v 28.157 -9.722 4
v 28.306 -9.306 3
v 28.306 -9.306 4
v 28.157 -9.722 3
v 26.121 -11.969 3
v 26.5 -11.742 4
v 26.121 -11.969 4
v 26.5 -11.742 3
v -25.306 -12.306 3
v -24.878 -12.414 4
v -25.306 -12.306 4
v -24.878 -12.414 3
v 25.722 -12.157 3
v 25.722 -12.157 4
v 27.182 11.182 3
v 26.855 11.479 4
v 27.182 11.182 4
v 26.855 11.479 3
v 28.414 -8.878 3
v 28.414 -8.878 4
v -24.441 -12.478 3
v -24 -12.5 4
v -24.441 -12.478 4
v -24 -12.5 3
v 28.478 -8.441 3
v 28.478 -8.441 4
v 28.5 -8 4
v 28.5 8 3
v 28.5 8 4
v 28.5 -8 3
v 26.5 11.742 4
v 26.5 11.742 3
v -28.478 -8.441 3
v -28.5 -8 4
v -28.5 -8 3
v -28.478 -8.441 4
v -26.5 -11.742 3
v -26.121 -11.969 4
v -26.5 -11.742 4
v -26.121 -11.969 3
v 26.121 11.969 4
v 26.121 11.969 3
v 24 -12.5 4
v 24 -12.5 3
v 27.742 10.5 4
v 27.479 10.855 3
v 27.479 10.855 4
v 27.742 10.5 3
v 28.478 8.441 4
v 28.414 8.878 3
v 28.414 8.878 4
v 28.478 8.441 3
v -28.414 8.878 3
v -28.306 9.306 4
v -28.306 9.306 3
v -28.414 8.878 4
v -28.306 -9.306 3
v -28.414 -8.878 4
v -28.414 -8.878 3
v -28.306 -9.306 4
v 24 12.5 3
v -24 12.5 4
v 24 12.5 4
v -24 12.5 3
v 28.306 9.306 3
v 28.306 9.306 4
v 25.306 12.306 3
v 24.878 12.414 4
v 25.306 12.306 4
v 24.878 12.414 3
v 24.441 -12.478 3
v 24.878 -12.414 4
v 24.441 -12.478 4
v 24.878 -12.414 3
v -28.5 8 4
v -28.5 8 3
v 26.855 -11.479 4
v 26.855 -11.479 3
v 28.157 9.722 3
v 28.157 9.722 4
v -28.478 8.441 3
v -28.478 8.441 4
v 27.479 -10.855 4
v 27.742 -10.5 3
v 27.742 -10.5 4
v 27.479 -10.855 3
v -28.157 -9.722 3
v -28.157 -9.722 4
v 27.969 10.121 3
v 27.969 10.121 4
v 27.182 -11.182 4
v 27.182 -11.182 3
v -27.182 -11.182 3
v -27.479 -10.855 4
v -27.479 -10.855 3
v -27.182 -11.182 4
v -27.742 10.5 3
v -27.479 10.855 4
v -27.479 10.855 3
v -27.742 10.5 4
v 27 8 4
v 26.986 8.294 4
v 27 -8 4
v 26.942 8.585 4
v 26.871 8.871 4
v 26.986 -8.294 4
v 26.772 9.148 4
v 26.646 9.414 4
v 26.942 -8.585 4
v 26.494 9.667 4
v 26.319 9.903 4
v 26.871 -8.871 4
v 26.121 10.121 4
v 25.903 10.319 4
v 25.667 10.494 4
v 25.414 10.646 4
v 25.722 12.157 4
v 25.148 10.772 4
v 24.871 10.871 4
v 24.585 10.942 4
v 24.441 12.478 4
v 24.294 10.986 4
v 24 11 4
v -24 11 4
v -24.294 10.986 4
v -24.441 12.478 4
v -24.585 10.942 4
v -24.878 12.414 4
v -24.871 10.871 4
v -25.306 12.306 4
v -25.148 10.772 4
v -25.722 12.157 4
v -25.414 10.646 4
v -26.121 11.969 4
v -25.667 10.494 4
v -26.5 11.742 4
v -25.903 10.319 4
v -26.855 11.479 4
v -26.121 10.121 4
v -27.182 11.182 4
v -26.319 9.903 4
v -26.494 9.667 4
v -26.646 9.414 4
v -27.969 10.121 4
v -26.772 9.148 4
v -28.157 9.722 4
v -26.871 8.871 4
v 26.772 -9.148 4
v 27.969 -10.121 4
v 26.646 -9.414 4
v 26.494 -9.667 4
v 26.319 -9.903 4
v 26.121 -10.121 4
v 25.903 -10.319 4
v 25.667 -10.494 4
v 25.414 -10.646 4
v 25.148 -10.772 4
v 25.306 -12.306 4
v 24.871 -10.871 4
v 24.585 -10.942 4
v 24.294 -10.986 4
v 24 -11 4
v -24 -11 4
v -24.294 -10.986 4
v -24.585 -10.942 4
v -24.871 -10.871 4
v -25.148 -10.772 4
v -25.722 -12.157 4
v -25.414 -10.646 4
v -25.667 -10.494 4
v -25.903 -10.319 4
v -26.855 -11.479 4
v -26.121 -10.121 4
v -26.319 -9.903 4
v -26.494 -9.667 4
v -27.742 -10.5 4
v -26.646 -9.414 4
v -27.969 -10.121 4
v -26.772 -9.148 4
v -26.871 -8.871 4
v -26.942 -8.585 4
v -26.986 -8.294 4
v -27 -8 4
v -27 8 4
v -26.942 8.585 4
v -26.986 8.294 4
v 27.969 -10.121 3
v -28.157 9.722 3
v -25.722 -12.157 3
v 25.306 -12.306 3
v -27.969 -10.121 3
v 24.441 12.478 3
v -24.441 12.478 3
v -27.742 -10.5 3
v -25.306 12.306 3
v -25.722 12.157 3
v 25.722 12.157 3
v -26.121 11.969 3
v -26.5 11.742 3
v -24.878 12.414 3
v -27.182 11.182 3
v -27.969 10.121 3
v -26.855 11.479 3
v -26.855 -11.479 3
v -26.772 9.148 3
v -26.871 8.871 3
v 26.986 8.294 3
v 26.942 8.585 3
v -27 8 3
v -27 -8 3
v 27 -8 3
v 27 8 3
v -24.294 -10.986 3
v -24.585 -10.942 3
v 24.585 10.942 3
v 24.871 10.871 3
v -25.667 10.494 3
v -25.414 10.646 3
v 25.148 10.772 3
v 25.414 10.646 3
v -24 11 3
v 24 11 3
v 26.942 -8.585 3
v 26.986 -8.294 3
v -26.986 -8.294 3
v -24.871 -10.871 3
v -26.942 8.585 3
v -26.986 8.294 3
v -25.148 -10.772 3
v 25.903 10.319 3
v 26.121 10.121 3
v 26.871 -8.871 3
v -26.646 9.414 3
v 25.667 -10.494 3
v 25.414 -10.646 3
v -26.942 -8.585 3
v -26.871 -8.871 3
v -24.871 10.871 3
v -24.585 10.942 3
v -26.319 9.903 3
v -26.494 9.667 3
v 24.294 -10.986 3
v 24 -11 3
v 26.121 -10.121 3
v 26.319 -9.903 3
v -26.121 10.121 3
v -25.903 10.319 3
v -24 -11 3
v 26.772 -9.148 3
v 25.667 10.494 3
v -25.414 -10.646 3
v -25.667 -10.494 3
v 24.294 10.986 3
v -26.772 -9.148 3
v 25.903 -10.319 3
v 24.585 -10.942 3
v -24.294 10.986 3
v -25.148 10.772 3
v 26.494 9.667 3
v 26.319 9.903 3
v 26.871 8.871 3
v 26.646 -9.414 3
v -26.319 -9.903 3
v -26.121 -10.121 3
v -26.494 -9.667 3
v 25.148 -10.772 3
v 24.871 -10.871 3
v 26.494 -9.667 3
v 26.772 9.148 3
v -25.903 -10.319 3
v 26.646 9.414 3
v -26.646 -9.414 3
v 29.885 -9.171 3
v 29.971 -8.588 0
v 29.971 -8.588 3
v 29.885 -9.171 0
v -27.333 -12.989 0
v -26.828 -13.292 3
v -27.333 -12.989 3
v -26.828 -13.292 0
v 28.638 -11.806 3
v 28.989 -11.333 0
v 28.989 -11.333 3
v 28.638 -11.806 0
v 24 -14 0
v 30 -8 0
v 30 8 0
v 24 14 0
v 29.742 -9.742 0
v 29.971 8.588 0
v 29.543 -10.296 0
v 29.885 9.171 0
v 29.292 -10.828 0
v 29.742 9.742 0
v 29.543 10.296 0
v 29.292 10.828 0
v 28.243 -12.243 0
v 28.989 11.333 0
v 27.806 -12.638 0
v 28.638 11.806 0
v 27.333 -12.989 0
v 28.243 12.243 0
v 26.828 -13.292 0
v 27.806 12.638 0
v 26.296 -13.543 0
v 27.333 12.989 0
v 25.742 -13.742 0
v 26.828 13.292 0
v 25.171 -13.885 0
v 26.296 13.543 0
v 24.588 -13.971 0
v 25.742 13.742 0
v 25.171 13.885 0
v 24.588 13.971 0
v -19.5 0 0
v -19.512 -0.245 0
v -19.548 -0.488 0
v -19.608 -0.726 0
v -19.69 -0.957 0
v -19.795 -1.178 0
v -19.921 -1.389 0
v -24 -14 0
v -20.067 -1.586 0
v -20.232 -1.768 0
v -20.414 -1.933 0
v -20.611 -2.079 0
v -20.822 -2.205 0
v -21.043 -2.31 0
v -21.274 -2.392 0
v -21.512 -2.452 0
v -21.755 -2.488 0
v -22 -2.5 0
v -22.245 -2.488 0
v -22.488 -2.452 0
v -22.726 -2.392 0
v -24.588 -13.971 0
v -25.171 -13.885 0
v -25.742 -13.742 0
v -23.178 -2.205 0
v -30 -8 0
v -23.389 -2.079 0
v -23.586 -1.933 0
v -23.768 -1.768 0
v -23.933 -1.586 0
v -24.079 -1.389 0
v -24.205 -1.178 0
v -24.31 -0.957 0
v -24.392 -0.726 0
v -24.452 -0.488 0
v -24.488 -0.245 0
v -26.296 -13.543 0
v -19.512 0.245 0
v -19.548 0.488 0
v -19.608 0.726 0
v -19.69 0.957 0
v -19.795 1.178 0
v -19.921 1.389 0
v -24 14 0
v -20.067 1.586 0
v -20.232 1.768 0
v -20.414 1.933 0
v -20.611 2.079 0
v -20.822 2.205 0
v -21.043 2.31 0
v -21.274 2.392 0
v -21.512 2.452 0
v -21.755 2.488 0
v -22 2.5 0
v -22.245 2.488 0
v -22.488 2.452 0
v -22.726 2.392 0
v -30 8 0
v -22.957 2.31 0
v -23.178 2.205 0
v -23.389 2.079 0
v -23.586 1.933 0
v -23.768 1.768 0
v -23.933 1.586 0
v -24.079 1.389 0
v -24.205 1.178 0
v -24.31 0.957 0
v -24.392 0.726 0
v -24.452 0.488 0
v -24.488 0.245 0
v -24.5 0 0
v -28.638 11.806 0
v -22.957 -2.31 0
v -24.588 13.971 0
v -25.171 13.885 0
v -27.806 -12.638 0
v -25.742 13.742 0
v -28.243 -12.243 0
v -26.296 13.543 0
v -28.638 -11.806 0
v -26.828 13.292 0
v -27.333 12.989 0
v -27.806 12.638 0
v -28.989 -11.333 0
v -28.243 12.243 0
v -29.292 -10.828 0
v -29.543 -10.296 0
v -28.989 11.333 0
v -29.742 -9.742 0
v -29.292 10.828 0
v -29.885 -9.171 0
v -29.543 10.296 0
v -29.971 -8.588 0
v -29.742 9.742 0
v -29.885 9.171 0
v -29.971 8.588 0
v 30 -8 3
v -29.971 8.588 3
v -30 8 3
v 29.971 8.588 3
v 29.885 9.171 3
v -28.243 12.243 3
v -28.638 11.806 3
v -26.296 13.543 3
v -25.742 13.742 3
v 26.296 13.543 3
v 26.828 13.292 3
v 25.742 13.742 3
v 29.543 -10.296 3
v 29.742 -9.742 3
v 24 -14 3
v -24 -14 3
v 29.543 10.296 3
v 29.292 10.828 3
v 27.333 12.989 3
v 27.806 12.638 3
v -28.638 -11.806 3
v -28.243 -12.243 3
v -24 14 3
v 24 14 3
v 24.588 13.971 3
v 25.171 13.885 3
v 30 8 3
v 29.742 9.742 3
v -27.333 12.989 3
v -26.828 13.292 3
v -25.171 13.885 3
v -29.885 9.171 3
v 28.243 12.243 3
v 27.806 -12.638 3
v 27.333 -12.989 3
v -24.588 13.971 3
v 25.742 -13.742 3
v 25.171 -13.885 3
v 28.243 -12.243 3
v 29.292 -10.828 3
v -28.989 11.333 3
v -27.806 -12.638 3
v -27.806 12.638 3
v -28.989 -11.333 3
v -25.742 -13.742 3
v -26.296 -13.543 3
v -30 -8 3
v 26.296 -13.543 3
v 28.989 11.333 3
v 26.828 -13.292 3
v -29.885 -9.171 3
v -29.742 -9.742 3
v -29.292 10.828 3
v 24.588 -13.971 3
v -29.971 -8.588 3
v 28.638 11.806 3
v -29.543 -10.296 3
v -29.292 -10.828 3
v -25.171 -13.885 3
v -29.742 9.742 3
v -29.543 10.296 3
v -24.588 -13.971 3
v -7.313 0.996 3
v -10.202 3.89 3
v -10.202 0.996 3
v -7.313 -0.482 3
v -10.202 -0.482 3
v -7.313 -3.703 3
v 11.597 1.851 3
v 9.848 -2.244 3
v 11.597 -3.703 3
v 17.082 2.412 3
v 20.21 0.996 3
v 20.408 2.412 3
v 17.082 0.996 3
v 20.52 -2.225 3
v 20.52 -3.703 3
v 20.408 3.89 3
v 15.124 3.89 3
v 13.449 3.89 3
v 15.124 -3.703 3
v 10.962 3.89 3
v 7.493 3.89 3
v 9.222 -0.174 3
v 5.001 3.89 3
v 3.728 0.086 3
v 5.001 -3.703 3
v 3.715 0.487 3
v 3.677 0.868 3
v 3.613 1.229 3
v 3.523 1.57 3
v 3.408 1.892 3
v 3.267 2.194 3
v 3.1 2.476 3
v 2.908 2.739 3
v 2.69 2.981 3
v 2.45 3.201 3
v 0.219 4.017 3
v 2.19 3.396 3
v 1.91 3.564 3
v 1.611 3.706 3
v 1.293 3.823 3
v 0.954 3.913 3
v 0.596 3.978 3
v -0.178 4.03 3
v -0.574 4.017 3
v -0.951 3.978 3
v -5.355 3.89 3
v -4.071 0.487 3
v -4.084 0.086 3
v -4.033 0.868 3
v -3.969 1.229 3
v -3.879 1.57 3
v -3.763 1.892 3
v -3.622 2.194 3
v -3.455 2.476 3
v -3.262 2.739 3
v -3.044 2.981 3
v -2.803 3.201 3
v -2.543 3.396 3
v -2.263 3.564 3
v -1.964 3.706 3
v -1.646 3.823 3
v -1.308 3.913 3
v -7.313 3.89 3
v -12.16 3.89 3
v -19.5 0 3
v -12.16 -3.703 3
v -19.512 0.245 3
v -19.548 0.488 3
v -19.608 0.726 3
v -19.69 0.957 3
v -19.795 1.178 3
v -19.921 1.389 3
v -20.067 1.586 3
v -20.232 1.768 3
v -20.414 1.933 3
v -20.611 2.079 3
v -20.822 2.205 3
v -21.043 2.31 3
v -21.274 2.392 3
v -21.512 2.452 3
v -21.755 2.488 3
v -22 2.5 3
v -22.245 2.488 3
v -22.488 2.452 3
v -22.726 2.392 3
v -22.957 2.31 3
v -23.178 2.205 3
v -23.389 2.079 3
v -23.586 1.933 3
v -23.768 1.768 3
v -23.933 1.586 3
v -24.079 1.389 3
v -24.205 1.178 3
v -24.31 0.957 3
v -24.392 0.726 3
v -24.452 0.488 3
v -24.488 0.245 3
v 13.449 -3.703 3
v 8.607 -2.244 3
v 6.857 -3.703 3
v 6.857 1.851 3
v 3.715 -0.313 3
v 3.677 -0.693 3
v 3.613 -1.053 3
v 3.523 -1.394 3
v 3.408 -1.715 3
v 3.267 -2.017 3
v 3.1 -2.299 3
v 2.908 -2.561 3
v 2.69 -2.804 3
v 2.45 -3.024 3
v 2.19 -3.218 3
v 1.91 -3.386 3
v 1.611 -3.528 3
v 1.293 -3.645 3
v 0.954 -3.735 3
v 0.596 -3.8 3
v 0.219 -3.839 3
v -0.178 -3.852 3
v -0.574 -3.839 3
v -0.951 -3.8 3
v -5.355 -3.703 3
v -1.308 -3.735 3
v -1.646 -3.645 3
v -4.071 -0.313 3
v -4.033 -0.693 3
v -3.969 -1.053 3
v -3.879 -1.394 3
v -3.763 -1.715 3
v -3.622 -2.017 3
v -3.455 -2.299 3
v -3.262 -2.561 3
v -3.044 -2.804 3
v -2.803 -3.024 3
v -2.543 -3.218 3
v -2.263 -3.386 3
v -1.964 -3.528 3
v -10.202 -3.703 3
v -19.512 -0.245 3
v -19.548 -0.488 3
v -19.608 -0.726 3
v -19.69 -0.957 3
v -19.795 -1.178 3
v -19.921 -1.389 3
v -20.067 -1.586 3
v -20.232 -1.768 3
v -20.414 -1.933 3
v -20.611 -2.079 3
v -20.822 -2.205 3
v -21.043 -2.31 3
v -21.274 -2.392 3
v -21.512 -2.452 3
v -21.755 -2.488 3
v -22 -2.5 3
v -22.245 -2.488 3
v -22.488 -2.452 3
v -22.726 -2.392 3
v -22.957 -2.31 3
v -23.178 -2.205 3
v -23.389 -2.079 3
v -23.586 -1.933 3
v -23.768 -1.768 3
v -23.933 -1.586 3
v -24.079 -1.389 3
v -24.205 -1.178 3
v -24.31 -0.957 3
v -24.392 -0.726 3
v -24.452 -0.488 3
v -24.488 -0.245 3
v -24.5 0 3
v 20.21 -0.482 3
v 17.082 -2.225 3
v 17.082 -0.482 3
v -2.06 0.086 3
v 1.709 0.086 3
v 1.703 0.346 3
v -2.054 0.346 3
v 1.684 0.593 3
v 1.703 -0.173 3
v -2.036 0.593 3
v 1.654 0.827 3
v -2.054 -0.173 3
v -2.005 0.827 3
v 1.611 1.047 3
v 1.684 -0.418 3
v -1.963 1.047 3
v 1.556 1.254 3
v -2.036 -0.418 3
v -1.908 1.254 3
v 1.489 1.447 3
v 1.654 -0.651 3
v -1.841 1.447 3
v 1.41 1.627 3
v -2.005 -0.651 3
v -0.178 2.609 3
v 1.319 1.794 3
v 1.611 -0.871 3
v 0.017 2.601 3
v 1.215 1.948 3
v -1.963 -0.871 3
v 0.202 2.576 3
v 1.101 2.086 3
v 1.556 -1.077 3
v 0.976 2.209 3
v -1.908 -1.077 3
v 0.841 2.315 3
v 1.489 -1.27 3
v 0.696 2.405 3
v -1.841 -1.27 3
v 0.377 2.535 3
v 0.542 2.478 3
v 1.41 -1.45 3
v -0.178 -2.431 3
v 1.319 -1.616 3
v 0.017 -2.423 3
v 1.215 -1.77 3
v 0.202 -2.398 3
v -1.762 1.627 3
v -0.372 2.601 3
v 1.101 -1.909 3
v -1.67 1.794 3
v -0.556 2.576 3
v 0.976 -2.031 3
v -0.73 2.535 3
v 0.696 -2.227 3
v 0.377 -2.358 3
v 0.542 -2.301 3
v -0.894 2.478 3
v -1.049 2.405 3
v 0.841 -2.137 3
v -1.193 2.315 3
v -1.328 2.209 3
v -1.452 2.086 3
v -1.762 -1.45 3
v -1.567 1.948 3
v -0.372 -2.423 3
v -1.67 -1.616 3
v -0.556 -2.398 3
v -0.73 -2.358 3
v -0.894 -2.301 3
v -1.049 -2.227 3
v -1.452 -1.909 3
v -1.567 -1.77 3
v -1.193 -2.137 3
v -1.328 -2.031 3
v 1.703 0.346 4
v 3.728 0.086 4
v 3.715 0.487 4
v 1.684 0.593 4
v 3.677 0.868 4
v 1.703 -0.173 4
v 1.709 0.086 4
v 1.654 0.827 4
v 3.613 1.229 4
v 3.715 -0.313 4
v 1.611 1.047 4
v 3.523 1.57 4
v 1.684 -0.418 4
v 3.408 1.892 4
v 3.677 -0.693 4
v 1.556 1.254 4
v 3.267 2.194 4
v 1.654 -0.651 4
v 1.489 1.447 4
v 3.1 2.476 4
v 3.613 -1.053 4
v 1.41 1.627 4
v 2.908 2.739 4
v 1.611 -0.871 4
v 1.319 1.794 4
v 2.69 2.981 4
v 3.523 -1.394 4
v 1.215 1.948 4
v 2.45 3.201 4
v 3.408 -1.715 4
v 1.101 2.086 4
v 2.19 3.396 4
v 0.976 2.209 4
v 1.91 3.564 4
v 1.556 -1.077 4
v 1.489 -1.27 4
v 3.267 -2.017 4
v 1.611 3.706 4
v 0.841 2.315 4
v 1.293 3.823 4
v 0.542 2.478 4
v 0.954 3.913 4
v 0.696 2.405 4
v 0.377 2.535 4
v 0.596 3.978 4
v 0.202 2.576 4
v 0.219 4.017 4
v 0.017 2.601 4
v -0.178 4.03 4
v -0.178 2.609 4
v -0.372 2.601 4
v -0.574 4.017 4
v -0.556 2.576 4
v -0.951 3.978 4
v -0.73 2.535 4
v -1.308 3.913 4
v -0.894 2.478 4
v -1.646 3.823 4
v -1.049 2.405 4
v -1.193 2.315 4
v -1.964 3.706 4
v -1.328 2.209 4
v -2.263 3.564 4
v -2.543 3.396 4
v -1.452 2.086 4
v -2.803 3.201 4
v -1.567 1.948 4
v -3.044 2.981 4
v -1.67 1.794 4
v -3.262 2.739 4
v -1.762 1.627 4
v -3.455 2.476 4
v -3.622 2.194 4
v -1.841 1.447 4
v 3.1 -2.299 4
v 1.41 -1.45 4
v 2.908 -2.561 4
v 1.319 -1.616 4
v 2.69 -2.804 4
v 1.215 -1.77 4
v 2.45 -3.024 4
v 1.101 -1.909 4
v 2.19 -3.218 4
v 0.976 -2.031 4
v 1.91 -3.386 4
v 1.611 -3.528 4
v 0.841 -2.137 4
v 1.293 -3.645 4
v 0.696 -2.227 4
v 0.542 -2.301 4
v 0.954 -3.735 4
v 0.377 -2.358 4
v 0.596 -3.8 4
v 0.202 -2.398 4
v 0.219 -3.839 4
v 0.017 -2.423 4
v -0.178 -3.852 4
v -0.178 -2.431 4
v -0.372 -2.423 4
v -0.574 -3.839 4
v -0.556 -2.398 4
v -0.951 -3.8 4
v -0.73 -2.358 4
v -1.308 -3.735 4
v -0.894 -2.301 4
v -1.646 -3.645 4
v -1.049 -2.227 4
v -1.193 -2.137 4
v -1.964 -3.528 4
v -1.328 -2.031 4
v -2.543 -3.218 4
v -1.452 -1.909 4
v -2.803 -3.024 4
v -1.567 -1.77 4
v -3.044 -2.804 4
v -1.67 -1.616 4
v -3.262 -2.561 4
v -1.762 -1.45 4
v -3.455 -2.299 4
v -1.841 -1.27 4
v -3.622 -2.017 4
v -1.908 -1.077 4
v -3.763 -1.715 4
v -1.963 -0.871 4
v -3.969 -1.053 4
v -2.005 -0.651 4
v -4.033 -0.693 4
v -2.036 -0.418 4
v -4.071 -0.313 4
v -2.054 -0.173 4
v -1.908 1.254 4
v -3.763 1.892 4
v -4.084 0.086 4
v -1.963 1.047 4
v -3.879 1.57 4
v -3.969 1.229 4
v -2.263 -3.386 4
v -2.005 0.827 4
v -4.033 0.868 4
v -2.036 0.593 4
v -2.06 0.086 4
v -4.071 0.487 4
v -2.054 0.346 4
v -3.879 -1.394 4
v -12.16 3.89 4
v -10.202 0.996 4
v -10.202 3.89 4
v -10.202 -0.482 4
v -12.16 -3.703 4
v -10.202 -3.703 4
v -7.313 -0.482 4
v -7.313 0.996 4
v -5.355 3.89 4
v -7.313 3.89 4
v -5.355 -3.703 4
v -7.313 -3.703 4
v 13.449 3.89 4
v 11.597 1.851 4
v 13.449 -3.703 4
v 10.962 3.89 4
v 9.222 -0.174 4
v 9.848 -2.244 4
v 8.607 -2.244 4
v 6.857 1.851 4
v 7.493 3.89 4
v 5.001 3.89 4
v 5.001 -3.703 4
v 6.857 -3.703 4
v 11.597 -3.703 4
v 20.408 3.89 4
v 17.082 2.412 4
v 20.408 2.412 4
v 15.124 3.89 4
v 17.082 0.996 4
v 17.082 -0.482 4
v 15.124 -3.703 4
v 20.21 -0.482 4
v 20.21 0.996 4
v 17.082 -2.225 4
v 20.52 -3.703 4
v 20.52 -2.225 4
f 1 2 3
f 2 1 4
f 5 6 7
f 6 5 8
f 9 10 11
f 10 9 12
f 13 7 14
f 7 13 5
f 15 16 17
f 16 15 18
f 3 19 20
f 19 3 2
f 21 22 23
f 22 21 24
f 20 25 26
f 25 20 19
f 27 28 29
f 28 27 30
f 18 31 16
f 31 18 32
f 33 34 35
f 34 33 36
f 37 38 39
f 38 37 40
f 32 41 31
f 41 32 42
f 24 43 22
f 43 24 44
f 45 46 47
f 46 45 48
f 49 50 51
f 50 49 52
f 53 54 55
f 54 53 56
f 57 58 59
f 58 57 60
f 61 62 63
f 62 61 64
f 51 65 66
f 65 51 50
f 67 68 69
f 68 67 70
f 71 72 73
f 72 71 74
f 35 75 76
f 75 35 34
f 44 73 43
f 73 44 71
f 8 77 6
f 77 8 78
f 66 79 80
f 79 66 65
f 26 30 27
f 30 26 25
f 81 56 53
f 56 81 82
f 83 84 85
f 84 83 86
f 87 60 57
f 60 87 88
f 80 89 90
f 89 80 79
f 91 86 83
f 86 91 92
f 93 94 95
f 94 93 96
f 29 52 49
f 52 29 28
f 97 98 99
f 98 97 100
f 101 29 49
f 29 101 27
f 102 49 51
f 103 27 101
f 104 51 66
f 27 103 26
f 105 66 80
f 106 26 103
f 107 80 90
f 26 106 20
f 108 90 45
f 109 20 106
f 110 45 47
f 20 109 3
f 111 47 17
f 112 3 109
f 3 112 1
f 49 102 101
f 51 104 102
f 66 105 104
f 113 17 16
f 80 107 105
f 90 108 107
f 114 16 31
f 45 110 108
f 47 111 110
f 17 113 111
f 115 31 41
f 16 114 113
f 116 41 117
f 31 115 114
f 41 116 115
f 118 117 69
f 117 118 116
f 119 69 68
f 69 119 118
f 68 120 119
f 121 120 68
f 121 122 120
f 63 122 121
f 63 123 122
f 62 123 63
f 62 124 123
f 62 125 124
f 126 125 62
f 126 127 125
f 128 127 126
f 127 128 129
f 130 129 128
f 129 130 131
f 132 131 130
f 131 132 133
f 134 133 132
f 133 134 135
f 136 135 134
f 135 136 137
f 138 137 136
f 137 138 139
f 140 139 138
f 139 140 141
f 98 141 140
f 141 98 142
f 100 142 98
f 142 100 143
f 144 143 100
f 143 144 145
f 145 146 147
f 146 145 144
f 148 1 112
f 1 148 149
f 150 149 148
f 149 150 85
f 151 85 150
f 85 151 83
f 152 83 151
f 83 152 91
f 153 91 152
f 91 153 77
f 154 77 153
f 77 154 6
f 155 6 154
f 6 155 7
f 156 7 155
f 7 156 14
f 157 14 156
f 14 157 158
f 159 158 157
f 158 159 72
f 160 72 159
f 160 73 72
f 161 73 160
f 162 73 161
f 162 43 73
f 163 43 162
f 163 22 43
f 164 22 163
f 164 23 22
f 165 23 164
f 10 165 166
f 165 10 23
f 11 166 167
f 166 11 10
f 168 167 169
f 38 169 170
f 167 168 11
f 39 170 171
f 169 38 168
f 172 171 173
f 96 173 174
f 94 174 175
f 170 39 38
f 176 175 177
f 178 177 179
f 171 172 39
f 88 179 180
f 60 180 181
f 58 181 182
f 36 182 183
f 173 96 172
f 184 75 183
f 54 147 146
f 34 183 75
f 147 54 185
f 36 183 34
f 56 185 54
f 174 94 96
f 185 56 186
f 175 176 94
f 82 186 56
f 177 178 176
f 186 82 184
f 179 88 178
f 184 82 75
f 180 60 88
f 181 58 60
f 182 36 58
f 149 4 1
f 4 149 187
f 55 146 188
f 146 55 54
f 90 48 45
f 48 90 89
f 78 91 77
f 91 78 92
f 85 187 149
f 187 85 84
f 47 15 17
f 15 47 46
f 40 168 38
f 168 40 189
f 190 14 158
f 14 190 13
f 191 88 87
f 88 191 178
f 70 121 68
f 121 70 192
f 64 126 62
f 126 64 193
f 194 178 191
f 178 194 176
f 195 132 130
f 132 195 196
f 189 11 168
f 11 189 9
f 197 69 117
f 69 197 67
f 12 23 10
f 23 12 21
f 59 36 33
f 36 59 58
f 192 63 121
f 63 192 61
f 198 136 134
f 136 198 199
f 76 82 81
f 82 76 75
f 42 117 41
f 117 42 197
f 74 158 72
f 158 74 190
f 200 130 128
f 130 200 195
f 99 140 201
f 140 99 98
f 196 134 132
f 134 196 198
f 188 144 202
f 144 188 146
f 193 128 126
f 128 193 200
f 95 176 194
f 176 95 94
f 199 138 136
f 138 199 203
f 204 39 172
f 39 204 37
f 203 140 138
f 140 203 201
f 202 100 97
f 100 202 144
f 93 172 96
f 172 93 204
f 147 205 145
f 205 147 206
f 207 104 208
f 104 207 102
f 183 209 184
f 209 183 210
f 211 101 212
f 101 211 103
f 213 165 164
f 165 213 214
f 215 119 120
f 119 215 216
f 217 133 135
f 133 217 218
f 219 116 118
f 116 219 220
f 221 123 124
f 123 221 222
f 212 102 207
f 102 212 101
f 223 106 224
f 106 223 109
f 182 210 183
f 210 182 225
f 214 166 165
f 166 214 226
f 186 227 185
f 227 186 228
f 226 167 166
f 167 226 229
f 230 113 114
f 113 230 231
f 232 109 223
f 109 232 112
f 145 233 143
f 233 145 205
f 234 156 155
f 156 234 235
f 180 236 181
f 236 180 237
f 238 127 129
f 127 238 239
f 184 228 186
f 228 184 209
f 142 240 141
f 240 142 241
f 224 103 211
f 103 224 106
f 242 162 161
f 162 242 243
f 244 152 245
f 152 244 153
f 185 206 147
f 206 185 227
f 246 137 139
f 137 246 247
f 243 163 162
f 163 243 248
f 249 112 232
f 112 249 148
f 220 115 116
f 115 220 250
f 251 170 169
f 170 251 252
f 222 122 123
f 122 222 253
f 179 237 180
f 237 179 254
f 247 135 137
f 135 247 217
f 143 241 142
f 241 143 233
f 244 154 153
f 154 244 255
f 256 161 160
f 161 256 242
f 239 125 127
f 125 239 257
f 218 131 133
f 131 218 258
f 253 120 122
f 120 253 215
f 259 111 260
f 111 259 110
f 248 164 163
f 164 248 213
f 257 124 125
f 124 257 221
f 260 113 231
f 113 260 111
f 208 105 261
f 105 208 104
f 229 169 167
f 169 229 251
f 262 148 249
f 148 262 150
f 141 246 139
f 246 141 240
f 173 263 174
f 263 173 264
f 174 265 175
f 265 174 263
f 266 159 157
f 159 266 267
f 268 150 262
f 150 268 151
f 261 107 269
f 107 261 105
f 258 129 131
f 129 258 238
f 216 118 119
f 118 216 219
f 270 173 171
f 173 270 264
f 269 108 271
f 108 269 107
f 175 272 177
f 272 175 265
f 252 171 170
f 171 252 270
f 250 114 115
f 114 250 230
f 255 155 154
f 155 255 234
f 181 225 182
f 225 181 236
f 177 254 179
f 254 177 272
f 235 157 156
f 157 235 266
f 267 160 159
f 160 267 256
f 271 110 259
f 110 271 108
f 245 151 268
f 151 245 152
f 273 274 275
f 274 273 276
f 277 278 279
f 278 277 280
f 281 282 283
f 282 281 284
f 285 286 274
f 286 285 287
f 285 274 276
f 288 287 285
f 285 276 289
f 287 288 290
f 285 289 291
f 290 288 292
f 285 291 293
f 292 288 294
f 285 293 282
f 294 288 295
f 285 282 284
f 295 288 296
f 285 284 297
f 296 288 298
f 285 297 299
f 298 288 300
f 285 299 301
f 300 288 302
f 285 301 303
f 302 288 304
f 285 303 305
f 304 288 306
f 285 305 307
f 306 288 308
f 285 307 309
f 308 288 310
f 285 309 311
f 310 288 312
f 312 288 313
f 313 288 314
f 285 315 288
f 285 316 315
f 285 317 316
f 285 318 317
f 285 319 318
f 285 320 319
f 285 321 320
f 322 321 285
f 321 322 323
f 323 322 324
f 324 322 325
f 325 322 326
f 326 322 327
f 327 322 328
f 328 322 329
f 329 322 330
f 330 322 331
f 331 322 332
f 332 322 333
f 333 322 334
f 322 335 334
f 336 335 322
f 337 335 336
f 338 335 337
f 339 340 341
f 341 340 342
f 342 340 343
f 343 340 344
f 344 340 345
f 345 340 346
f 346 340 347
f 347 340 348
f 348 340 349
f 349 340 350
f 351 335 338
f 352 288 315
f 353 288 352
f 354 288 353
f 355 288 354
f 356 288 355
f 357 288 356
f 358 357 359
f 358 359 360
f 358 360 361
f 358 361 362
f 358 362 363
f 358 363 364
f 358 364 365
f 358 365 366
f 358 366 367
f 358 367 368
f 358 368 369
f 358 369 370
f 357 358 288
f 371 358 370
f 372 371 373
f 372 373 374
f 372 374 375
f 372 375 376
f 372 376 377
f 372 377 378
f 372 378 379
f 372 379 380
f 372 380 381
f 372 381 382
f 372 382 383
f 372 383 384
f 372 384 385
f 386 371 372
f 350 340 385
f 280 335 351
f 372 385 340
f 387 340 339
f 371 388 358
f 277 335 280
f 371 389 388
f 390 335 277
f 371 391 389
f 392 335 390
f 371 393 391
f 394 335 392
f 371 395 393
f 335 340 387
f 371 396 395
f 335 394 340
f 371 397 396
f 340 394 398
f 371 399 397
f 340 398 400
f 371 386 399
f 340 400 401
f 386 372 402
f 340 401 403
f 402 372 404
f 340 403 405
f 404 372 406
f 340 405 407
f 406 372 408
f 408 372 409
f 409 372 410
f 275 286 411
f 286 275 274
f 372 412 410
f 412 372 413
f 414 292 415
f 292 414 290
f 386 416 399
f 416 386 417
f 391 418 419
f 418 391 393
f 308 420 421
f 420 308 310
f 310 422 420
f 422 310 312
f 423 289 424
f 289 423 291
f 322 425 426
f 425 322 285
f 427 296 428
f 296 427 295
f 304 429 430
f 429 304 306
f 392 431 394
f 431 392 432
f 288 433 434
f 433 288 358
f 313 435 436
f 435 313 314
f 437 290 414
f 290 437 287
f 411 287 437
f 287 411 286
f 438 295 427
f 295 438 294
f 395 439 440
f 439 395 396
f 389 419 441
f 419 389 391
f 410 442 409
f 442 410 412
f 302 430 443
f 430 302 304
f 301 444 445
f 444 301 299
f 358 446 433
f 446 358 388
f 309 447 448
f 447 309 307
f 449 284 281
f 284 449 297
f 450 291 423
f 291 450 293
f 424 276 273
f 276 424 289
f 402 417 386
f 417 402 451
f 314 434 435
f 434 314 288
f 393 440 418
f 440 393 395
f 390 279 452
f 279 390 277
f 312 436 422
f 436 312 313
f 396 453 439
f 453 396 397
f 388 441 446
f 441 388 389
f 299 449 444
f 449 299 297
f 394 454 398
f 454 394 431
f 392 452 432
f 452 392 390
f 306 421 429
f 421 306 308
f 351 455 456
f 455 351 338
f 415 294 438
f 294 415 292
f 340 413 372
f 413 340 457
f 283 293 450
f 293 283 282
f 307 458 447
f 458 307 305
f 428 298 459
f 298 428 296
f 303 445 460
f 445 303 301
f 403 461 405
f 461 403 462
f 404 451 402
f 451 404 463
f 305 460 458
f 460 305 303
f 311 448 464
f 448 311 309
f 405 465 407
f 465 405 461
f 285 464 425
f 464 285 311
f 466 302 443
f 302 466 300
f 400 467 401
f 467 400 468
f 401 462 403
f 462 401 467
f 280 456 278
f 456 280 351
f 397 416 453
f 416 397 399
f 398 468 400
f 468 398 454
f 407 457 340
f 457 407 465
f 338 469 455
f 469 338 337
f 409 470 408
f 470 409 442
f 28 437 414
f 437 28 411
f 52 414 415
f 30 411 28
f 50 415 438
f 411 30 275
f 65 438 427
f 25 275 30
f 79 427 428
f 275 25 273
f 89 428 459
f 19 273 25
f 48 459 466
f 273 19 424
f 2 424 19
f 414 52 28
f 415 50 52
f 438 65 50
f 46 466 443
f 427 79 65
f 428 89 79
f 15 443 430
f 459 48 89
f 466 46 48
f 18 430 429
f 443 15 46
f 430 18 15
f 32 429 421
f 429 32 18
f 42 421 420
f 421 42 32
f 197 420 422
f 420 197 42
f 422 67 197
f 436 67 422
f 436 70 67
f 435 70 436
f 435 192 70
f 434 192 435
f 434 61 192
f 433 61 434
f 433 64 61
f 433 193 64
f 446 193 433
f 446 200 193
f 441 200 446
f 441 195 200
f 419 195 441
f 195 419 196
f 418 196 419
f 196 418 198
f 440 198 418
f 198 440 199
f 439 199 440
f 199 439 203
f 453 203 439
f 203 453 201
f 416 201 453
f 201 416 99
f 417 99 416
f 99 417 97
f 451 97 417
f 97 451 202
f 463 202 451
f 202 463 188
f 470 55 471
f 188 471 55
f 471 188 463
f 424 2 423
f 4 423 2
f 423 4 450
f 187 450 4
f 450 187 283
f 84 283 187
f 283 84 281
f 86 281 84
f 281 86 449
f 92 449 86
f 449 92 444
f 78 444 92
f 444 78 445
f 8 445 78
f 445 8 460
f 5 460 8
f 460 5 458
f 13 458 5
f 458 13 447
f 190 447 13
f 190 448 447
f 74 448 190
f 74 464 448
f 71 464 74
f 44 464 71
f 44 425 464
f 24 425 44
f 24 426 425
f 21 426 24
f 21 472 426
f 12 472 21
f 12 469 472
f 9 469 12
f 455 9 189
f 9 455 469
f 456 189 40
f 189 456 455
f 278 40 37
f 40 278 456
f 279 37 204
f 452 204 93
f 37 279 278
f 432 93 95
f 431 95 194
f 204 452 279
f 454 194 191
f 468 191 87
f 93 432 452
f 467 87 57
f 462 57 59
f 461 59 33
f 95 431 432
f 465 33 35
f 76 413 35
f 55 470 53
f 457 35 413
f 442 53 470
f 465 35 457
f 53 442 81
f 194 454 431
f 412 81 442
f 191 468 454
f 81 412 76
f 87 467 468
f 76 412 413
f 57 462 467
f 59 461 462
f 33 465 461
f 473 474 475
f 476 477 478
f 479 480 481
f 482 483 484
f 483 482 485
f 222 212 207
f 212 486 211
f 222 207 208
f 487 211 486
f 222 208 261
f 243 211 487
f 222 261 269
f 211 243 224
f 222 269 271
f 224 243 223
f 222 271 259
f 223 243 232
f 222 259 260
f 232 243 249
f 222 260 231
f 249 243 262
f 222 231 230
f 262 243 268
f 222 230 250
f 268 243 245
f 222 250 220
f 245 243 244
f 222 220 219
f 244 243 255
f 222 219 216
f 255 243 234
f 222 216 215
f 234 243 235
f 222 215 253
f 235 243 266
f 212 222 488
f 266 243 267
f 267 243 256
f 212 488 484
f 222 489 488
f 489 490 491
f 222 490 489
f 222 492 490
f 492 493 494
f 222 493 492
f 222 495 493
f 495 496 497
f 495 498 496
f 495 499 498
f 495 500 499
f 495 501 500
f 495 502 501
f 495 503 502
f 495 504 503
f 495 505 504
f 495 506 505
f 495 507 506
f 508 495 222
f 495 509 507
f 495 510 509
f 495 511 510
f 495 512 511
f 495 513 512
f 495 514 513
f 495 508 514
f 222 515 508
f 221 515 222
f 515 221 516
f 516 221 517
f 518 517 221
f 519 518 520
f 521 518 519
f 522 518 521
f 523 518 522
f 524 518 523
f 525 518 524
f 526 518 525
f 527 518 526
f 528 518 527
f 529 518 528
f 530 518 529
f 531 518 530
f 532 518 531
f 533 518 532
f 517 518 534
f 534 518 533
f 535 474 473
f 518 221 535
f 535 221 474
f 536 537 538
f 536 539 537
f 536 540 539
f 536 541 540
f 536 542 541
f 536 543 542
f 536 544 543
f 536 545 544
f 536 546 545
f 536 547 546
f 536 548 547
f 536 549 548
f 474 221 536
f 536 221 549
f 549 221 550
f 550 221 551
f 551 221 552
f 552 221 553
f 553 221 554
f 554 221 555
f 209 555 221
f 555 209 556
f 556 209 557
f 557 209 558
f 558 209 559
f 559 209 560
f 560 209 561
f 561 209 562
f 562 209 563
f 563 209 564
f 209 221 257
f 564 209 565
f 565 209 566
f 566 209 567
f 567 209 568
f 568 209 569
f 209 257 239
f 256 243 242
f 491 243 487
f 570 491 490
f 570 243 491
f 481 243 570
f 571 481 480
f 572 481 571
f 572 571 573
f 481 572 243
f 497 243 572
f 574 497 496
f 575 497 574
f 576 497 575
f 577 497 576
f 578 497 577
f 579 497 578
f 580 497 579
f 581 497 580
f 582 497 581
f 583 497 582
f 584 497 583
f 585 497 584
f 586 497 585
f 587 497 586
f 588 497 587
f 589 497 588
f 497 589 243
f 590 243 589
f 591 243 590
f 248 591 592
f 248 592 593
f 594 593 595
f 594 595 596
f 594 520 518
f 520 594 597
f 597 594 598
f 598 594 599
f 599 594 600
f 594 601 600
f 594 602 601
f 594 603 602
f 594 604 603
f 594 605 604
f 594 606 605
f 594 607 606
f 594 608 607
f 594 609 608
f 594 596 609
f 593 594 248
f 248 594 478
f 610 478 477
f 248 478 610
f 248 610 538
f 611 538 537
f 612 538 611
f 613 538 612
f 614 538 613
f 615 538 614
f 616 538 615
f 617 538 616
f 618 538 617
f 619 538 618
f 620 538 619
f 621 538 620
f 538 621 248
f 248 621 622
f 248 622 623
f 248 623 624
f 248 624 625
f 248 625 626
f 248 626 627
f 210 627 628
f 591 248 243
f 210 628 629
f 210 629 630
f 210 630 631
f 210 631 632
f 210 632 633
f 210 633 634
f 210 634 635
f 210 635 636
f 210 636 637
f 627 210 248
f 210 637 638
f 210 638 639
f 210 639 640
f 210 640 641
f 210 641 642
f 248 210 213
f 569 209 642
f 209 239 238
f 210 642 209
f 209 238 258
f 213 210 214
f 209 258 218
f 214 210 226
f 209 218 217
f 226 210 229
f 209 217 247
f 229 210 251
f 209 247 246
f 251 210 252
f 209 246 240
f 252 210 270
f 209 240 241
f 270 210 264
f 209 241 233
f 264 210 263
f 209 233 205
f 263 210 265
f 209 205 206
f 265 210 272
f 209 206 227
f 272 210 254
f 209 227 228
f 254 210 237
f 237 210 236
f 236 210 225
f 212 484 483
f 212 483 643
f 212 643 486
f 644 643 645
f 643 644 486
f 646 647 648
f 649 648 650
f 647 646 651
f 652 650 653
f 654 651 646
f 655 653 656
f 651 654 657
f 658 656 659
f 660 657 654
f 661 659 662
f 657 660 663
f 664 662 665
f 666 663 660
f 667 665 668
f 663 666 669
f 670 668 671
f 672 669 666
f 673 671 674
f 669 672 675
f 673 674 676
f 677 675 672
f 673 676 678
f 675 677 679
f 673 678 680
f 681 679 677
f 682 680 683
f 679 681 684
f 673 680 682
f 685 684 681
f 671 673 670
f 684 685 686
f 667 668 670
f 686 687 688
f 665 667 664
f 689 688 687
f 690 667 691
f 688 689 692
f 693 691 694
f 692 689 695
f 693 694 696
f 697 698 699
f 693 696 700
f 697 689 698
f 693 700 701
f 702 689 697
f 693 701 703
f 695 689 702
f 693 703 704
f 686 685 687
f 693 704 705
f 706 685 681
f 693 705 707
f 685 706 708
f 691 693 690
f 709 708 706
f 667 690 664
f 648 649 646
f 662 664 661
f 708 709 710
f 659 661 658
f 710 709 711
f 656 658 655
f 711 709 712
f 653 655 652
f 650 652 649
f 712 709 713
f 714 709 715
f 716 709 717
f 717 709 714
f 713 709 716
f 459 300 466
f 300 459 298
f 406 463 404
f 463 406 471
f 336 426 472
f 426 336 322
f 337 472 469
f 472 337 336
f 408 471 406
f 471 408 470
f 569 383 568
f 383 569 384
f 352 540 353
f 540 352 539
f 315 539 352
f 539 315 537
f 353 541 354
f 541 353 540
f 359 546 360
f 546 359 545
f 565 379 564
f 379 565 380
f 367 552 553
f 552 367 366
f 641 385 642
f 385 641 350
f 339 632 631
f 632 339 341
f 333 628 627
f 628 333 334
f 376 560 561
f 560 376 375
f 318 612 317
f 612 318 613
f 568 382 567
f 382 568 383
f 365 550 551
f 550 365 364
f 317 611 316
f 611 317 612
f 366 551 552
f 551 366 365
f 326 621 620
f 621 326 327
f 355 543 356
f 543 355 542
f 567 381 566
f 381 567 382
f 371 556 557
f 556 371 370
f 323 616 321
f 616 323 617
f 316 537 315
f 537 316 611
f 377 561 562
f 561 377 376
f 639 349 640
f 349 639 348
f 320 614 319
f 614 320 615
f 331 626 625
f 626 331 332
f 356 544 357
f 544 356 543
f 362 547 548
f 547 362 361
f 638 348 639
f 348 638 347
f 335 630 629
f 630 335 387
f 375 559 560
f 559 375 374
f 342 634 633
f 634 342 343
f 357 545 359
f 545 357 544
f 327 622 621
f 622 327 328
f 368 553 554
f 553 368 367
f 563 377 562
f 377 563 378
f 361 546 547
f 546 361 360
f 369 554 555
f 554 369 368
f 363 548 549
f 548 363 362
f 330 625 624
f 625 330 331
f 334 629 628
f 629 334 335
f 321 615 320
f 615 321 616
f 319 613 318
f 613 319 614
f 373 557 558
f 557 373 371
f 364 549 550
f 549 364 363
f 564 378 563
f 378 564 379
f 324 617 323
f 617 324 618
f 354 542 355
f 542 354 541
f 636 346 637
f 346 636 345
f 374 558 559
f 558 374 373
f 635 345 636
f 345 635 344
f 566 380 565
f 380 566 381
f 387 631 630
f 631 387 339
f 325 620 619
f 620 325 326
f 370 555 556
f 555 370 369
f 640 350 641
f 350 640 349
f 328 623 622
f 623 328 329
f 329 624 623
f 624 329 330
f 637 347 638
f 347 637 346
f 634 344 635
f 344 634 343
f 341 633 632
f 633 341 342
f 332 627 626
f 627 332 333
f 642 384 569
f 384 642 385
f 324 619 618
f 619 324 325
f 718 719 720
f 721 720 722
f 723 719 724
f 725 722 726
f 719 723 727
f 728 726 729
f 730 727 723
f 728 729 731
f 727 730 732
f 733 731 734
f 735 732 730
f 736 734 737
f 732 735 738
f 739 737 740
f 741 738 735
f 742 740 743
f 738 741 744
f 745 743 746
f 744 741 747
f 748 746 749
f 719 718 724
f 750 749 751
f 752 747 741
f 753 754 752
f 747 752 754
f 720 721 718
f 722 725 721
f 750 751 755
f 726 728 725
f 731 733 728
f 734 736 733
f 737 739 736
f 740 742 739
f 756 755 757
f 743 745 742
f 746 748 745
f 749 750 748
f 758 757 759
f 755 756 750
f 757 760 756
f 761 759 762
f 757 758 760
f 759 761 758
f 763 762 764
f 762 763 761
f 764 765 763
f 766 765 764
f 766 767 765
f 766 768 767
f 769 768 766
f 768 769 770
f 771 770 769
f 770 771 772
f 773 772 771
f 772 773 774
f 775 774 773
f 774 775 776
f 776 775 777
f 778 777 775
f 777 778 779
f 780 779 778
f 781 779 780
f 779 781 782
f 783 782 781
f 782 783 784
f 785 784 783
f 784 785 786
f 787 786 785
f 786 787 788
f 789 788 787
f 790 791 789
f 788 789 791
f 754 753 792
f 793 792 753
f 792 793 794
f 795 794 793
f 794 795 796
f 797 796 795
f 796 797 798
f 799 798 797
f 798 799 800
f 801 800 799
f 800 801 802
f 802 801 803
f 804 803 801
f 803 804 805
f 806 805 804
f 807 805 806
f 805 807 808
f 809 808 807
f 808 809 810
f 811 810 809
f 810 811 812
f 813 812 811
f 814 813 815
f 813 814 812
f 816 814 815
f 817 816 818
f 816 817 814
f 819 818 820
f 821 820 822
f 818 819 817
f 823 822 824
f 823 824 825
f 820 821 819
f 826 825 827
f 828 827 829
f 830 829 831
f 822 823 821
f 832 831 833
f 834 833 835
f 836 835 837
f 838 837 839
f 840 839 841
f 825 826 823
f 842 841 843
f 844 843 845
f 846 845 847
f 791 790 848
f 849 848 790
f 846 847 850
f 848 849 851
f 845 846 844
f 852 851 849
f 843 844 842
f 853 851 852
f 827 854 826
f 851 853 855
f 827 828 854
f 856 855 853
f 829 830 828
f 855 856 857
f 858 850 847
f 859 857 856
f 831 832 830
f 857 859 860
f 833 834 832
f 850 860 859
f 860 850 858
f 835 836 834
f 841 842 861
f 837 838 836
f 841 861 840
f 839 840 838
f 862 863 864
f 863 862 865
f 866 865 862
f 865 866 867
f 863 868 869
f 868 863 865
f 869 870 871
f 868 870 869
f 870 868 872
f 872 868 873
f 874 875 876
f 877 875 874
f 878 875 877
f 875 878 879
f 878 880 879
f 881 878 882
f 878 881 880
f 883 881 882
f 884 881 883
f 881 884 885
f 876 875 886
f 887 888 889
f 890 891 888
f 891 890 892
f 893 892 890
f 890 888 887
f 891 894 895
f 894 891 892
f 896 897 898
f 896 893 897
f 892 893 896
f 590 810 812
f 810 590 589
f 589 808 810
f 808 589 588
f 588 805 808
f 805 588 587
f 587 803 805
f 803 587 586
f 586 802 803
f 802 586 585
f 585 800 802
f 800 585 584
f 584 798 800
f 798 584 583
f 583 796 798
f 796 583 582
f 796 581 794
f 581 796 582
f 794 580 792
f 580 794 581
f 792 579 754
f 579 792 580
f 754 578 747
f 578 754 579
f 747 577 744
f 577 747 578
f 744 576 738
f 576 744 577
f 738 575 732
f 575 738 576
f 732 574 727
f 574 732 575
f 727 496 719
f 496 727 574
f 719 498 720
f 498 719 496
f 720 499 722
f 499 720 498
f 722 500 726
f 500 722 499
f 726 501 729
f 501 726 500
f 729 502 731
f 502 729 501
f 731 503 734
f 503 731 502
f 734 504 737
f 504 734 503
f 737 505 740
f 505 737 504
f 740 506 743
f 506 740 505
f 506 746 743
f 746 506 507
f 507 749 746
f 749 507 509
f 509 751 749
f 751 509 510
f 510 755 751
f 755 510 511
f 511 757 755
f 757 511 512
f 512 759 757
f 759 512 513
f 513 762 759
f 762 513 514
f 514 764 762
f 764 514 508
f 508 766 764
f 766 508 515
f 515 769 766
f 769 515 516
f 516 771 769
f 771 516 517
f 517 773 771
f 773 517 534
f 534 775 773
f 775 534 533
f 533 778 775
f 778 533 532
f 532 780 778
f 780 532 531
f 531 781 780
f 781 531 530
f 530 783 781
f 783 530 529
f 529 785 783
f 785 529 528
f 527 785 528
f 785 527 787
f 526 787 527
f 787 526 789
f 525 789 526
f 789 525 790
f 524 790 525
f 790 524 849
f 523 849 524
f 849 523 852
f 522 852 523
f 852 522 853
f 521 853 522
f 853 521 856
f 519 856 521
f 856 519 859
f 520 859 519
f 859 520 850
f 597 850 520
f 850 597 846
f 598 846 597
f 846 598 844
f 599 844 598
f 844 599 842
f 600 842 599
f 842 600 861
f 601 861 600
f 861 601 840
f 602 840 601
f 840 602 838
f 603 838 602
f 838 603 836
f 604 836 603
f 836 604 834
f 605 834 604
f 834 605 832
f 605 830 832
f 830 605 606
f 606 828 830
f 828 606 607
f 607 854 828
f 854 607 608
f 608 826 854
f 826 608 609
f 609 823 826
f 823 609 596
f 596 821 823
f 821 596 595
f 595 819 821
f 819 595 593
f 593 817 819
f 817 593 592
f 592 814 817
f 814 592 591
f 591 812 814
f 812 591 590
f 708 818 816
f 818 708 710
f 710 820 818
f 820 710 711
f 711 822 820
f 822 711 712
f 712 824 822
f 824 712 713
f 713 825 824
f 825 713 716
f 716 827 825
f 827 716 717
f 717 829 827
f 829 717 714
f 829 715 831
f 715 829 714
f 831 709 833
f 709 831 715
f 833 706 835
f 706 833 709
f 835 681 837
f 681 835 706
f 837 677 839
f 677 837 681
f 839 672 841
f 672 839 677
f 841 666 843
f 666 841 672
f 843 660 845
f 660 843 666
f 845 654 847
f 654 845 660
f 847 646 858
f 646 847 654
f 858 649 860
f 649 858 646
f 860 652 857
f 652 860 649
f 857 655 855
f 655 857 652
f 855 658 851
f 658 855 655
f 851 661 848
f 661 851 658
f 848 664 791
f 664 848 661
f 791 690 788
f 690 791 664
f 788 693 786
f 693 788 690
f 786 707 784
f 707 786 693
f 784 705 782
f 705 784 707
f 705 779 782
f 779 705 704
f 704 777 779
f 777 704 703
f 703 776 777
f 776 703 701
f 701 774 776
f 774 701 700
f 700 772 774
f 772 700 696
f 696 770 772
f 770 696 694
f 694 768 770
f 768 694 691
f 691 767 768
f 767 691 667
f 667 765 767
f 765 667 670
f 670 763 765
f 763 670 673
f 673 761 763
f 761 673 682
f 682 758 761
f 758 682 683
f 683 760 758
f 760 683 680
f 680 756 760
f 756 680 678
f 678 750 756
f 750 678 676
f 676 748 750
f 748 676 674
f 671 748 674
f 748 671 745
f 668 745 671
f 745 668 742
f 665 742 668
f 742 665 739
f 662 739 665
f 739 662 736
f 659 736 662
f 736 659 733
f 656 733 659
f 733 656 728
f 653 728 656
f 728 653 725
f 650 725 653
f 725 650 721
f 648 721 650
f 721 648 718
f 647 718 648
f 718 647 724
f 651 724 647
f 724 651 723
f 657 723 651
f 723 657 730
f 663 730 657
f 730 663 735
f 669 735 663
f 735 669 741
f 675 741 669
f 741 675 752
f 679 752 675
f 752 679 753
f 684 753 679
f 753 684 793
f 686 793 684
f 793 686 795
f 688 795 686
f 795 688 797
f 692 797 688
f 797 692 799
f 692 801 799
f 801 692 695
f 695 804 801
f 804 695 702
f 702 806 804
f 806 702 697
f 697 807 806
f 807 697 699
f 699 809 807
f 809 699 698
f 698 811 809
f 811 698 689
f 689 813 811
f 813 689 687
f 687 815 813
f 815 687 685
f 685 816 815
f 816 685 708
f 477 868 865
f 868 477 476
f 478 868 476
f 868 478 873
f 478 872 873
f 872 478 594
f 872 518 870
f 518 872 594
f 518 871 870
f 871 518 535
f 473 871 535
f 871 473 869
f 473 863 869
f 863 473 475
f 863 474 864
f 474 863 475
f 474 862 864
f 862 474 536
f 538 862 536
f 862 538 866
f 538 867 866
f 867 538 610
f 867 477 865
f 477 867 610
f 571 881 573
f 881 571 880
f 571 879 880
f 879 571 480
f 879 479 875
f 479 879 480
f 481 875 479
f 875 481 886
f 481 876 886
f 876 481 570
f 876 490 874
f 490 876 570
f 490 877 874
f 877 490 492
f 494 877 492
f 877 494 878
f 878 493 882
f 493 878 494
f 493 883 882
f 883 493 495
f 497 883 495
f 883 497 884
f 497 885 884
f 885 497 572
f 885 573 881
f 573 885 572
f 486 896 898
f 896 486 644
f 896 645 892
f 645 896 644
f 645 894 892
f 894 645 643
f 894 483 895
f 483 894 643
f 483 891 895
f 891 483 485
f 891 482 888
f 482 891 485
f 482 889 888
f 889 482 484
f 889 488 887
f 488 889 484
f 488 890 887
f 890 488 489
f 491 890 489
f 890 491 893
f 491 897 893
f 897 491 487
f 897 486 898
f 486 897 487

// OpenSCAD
// Key tags and luggage tag - original parametric design (Brian Sacco). Flat tags, raised text, no supports.
// part: "tag_rect", "tag_round", "tag_hex", "luggage". Everything prints flat on the bed, text facing up.
part  = "tag_rect";
label = "HOME";     // raised text ("" = blank tag)
hole  = 5;          // key ring hole diameter (mm)
t     = 3;          // plate thickness (mm)
th    = 1;          // text / rim height above the plate (mm)
$fn   = 64;

module rrect(w, d, h, r) {
    hull() for (sx = [-1, 1], sy = [-1, 1]) translate([sx * (w / 2 - r), sy * (d / 2 - r), 0]) cylinder(r = r, h = h);
}
module txt(size) {
    if (label != "") translate([0, 0, t - 0.01]) linear_extrude(th + 0.01)
        text(label, size = size, font = "DejaVu Sans:style=Bold", halign = "center", valign = "center");
}
module tag_rect() {
    W = 60; D = 28;
    difference() {
        union() {
            rrect(W, D, t, 6);
            translate([0, 0, t - 0.01]) difference() {                  // raised rim
                rrect(W - 3, D - 3, th + 0.01, 4.5);
                translate([0, 0, -0.1]) rrect(W - 6, D - 6, th + 0.5, 3);
            }
        }
        translate([-W / 2 + 8, 0, -0.1]) cylinder(d = hole, h = t + th + 1);
    }
    translate([4, 0, 0]) txt(7.5);
}
module tag_round() {
    d0 = 36;
    difference() {
        union() {
            cylinder(d = d0, h = t);
            translate([0, 0, t - 0.01]) difference() {
                cylinder(d = d0 - 3, h = th + 0.01);
                translate([0, 0, -0.1]) cylinder(d = d0 - 6, h = th + 0.5);
            }
        }
        translate([0, d0 / 2 - 5.5, -0.1]) cylinder(d = hole, h = t + th + 1);
    }
    translate([0, -3, 0]) txt(11);
}
module tag_hex() {
    d0 = 40;
    difference() {
        union() {
            cylinder(d = d0, h = t, $fn = 6);
            translate([0, 0, t - 0.01]) difference() {
                cylinder(d = d0 - 4, h = th + 0.01, $fn = 6);
                translate([0, 0, -0.1]) cylinder(d = d0 - 7, h = th + 0.5, $fn = 6);
            }
        }
        translate([0, d0 * 0.866 / 2 - 6, -0.1]) rotate(0) cylinder(d = hole, h = t + th + 1);
    }
    translate([0, -3, 0]) txt(10);
}
module luggage() {
    W = 95; D = 60;
    difference() {
        rrect(W, D, t, 7);
        translate([-W / 2 + 10 - 2, -12, -0.1]) cube([4, 24, t + 1]);                       // strap slot
        translate([8, 0, t - 1.0]) rrect(62, 40, 2, 3);                                      // 1 mm recess for a printed name card
    }
}
if (part == "tag_rect") tag_rect();
if (part == "tag_round") tag_round();
if (part == "tag_hex") tag_hex();
if (part == "luggage") luggage();
